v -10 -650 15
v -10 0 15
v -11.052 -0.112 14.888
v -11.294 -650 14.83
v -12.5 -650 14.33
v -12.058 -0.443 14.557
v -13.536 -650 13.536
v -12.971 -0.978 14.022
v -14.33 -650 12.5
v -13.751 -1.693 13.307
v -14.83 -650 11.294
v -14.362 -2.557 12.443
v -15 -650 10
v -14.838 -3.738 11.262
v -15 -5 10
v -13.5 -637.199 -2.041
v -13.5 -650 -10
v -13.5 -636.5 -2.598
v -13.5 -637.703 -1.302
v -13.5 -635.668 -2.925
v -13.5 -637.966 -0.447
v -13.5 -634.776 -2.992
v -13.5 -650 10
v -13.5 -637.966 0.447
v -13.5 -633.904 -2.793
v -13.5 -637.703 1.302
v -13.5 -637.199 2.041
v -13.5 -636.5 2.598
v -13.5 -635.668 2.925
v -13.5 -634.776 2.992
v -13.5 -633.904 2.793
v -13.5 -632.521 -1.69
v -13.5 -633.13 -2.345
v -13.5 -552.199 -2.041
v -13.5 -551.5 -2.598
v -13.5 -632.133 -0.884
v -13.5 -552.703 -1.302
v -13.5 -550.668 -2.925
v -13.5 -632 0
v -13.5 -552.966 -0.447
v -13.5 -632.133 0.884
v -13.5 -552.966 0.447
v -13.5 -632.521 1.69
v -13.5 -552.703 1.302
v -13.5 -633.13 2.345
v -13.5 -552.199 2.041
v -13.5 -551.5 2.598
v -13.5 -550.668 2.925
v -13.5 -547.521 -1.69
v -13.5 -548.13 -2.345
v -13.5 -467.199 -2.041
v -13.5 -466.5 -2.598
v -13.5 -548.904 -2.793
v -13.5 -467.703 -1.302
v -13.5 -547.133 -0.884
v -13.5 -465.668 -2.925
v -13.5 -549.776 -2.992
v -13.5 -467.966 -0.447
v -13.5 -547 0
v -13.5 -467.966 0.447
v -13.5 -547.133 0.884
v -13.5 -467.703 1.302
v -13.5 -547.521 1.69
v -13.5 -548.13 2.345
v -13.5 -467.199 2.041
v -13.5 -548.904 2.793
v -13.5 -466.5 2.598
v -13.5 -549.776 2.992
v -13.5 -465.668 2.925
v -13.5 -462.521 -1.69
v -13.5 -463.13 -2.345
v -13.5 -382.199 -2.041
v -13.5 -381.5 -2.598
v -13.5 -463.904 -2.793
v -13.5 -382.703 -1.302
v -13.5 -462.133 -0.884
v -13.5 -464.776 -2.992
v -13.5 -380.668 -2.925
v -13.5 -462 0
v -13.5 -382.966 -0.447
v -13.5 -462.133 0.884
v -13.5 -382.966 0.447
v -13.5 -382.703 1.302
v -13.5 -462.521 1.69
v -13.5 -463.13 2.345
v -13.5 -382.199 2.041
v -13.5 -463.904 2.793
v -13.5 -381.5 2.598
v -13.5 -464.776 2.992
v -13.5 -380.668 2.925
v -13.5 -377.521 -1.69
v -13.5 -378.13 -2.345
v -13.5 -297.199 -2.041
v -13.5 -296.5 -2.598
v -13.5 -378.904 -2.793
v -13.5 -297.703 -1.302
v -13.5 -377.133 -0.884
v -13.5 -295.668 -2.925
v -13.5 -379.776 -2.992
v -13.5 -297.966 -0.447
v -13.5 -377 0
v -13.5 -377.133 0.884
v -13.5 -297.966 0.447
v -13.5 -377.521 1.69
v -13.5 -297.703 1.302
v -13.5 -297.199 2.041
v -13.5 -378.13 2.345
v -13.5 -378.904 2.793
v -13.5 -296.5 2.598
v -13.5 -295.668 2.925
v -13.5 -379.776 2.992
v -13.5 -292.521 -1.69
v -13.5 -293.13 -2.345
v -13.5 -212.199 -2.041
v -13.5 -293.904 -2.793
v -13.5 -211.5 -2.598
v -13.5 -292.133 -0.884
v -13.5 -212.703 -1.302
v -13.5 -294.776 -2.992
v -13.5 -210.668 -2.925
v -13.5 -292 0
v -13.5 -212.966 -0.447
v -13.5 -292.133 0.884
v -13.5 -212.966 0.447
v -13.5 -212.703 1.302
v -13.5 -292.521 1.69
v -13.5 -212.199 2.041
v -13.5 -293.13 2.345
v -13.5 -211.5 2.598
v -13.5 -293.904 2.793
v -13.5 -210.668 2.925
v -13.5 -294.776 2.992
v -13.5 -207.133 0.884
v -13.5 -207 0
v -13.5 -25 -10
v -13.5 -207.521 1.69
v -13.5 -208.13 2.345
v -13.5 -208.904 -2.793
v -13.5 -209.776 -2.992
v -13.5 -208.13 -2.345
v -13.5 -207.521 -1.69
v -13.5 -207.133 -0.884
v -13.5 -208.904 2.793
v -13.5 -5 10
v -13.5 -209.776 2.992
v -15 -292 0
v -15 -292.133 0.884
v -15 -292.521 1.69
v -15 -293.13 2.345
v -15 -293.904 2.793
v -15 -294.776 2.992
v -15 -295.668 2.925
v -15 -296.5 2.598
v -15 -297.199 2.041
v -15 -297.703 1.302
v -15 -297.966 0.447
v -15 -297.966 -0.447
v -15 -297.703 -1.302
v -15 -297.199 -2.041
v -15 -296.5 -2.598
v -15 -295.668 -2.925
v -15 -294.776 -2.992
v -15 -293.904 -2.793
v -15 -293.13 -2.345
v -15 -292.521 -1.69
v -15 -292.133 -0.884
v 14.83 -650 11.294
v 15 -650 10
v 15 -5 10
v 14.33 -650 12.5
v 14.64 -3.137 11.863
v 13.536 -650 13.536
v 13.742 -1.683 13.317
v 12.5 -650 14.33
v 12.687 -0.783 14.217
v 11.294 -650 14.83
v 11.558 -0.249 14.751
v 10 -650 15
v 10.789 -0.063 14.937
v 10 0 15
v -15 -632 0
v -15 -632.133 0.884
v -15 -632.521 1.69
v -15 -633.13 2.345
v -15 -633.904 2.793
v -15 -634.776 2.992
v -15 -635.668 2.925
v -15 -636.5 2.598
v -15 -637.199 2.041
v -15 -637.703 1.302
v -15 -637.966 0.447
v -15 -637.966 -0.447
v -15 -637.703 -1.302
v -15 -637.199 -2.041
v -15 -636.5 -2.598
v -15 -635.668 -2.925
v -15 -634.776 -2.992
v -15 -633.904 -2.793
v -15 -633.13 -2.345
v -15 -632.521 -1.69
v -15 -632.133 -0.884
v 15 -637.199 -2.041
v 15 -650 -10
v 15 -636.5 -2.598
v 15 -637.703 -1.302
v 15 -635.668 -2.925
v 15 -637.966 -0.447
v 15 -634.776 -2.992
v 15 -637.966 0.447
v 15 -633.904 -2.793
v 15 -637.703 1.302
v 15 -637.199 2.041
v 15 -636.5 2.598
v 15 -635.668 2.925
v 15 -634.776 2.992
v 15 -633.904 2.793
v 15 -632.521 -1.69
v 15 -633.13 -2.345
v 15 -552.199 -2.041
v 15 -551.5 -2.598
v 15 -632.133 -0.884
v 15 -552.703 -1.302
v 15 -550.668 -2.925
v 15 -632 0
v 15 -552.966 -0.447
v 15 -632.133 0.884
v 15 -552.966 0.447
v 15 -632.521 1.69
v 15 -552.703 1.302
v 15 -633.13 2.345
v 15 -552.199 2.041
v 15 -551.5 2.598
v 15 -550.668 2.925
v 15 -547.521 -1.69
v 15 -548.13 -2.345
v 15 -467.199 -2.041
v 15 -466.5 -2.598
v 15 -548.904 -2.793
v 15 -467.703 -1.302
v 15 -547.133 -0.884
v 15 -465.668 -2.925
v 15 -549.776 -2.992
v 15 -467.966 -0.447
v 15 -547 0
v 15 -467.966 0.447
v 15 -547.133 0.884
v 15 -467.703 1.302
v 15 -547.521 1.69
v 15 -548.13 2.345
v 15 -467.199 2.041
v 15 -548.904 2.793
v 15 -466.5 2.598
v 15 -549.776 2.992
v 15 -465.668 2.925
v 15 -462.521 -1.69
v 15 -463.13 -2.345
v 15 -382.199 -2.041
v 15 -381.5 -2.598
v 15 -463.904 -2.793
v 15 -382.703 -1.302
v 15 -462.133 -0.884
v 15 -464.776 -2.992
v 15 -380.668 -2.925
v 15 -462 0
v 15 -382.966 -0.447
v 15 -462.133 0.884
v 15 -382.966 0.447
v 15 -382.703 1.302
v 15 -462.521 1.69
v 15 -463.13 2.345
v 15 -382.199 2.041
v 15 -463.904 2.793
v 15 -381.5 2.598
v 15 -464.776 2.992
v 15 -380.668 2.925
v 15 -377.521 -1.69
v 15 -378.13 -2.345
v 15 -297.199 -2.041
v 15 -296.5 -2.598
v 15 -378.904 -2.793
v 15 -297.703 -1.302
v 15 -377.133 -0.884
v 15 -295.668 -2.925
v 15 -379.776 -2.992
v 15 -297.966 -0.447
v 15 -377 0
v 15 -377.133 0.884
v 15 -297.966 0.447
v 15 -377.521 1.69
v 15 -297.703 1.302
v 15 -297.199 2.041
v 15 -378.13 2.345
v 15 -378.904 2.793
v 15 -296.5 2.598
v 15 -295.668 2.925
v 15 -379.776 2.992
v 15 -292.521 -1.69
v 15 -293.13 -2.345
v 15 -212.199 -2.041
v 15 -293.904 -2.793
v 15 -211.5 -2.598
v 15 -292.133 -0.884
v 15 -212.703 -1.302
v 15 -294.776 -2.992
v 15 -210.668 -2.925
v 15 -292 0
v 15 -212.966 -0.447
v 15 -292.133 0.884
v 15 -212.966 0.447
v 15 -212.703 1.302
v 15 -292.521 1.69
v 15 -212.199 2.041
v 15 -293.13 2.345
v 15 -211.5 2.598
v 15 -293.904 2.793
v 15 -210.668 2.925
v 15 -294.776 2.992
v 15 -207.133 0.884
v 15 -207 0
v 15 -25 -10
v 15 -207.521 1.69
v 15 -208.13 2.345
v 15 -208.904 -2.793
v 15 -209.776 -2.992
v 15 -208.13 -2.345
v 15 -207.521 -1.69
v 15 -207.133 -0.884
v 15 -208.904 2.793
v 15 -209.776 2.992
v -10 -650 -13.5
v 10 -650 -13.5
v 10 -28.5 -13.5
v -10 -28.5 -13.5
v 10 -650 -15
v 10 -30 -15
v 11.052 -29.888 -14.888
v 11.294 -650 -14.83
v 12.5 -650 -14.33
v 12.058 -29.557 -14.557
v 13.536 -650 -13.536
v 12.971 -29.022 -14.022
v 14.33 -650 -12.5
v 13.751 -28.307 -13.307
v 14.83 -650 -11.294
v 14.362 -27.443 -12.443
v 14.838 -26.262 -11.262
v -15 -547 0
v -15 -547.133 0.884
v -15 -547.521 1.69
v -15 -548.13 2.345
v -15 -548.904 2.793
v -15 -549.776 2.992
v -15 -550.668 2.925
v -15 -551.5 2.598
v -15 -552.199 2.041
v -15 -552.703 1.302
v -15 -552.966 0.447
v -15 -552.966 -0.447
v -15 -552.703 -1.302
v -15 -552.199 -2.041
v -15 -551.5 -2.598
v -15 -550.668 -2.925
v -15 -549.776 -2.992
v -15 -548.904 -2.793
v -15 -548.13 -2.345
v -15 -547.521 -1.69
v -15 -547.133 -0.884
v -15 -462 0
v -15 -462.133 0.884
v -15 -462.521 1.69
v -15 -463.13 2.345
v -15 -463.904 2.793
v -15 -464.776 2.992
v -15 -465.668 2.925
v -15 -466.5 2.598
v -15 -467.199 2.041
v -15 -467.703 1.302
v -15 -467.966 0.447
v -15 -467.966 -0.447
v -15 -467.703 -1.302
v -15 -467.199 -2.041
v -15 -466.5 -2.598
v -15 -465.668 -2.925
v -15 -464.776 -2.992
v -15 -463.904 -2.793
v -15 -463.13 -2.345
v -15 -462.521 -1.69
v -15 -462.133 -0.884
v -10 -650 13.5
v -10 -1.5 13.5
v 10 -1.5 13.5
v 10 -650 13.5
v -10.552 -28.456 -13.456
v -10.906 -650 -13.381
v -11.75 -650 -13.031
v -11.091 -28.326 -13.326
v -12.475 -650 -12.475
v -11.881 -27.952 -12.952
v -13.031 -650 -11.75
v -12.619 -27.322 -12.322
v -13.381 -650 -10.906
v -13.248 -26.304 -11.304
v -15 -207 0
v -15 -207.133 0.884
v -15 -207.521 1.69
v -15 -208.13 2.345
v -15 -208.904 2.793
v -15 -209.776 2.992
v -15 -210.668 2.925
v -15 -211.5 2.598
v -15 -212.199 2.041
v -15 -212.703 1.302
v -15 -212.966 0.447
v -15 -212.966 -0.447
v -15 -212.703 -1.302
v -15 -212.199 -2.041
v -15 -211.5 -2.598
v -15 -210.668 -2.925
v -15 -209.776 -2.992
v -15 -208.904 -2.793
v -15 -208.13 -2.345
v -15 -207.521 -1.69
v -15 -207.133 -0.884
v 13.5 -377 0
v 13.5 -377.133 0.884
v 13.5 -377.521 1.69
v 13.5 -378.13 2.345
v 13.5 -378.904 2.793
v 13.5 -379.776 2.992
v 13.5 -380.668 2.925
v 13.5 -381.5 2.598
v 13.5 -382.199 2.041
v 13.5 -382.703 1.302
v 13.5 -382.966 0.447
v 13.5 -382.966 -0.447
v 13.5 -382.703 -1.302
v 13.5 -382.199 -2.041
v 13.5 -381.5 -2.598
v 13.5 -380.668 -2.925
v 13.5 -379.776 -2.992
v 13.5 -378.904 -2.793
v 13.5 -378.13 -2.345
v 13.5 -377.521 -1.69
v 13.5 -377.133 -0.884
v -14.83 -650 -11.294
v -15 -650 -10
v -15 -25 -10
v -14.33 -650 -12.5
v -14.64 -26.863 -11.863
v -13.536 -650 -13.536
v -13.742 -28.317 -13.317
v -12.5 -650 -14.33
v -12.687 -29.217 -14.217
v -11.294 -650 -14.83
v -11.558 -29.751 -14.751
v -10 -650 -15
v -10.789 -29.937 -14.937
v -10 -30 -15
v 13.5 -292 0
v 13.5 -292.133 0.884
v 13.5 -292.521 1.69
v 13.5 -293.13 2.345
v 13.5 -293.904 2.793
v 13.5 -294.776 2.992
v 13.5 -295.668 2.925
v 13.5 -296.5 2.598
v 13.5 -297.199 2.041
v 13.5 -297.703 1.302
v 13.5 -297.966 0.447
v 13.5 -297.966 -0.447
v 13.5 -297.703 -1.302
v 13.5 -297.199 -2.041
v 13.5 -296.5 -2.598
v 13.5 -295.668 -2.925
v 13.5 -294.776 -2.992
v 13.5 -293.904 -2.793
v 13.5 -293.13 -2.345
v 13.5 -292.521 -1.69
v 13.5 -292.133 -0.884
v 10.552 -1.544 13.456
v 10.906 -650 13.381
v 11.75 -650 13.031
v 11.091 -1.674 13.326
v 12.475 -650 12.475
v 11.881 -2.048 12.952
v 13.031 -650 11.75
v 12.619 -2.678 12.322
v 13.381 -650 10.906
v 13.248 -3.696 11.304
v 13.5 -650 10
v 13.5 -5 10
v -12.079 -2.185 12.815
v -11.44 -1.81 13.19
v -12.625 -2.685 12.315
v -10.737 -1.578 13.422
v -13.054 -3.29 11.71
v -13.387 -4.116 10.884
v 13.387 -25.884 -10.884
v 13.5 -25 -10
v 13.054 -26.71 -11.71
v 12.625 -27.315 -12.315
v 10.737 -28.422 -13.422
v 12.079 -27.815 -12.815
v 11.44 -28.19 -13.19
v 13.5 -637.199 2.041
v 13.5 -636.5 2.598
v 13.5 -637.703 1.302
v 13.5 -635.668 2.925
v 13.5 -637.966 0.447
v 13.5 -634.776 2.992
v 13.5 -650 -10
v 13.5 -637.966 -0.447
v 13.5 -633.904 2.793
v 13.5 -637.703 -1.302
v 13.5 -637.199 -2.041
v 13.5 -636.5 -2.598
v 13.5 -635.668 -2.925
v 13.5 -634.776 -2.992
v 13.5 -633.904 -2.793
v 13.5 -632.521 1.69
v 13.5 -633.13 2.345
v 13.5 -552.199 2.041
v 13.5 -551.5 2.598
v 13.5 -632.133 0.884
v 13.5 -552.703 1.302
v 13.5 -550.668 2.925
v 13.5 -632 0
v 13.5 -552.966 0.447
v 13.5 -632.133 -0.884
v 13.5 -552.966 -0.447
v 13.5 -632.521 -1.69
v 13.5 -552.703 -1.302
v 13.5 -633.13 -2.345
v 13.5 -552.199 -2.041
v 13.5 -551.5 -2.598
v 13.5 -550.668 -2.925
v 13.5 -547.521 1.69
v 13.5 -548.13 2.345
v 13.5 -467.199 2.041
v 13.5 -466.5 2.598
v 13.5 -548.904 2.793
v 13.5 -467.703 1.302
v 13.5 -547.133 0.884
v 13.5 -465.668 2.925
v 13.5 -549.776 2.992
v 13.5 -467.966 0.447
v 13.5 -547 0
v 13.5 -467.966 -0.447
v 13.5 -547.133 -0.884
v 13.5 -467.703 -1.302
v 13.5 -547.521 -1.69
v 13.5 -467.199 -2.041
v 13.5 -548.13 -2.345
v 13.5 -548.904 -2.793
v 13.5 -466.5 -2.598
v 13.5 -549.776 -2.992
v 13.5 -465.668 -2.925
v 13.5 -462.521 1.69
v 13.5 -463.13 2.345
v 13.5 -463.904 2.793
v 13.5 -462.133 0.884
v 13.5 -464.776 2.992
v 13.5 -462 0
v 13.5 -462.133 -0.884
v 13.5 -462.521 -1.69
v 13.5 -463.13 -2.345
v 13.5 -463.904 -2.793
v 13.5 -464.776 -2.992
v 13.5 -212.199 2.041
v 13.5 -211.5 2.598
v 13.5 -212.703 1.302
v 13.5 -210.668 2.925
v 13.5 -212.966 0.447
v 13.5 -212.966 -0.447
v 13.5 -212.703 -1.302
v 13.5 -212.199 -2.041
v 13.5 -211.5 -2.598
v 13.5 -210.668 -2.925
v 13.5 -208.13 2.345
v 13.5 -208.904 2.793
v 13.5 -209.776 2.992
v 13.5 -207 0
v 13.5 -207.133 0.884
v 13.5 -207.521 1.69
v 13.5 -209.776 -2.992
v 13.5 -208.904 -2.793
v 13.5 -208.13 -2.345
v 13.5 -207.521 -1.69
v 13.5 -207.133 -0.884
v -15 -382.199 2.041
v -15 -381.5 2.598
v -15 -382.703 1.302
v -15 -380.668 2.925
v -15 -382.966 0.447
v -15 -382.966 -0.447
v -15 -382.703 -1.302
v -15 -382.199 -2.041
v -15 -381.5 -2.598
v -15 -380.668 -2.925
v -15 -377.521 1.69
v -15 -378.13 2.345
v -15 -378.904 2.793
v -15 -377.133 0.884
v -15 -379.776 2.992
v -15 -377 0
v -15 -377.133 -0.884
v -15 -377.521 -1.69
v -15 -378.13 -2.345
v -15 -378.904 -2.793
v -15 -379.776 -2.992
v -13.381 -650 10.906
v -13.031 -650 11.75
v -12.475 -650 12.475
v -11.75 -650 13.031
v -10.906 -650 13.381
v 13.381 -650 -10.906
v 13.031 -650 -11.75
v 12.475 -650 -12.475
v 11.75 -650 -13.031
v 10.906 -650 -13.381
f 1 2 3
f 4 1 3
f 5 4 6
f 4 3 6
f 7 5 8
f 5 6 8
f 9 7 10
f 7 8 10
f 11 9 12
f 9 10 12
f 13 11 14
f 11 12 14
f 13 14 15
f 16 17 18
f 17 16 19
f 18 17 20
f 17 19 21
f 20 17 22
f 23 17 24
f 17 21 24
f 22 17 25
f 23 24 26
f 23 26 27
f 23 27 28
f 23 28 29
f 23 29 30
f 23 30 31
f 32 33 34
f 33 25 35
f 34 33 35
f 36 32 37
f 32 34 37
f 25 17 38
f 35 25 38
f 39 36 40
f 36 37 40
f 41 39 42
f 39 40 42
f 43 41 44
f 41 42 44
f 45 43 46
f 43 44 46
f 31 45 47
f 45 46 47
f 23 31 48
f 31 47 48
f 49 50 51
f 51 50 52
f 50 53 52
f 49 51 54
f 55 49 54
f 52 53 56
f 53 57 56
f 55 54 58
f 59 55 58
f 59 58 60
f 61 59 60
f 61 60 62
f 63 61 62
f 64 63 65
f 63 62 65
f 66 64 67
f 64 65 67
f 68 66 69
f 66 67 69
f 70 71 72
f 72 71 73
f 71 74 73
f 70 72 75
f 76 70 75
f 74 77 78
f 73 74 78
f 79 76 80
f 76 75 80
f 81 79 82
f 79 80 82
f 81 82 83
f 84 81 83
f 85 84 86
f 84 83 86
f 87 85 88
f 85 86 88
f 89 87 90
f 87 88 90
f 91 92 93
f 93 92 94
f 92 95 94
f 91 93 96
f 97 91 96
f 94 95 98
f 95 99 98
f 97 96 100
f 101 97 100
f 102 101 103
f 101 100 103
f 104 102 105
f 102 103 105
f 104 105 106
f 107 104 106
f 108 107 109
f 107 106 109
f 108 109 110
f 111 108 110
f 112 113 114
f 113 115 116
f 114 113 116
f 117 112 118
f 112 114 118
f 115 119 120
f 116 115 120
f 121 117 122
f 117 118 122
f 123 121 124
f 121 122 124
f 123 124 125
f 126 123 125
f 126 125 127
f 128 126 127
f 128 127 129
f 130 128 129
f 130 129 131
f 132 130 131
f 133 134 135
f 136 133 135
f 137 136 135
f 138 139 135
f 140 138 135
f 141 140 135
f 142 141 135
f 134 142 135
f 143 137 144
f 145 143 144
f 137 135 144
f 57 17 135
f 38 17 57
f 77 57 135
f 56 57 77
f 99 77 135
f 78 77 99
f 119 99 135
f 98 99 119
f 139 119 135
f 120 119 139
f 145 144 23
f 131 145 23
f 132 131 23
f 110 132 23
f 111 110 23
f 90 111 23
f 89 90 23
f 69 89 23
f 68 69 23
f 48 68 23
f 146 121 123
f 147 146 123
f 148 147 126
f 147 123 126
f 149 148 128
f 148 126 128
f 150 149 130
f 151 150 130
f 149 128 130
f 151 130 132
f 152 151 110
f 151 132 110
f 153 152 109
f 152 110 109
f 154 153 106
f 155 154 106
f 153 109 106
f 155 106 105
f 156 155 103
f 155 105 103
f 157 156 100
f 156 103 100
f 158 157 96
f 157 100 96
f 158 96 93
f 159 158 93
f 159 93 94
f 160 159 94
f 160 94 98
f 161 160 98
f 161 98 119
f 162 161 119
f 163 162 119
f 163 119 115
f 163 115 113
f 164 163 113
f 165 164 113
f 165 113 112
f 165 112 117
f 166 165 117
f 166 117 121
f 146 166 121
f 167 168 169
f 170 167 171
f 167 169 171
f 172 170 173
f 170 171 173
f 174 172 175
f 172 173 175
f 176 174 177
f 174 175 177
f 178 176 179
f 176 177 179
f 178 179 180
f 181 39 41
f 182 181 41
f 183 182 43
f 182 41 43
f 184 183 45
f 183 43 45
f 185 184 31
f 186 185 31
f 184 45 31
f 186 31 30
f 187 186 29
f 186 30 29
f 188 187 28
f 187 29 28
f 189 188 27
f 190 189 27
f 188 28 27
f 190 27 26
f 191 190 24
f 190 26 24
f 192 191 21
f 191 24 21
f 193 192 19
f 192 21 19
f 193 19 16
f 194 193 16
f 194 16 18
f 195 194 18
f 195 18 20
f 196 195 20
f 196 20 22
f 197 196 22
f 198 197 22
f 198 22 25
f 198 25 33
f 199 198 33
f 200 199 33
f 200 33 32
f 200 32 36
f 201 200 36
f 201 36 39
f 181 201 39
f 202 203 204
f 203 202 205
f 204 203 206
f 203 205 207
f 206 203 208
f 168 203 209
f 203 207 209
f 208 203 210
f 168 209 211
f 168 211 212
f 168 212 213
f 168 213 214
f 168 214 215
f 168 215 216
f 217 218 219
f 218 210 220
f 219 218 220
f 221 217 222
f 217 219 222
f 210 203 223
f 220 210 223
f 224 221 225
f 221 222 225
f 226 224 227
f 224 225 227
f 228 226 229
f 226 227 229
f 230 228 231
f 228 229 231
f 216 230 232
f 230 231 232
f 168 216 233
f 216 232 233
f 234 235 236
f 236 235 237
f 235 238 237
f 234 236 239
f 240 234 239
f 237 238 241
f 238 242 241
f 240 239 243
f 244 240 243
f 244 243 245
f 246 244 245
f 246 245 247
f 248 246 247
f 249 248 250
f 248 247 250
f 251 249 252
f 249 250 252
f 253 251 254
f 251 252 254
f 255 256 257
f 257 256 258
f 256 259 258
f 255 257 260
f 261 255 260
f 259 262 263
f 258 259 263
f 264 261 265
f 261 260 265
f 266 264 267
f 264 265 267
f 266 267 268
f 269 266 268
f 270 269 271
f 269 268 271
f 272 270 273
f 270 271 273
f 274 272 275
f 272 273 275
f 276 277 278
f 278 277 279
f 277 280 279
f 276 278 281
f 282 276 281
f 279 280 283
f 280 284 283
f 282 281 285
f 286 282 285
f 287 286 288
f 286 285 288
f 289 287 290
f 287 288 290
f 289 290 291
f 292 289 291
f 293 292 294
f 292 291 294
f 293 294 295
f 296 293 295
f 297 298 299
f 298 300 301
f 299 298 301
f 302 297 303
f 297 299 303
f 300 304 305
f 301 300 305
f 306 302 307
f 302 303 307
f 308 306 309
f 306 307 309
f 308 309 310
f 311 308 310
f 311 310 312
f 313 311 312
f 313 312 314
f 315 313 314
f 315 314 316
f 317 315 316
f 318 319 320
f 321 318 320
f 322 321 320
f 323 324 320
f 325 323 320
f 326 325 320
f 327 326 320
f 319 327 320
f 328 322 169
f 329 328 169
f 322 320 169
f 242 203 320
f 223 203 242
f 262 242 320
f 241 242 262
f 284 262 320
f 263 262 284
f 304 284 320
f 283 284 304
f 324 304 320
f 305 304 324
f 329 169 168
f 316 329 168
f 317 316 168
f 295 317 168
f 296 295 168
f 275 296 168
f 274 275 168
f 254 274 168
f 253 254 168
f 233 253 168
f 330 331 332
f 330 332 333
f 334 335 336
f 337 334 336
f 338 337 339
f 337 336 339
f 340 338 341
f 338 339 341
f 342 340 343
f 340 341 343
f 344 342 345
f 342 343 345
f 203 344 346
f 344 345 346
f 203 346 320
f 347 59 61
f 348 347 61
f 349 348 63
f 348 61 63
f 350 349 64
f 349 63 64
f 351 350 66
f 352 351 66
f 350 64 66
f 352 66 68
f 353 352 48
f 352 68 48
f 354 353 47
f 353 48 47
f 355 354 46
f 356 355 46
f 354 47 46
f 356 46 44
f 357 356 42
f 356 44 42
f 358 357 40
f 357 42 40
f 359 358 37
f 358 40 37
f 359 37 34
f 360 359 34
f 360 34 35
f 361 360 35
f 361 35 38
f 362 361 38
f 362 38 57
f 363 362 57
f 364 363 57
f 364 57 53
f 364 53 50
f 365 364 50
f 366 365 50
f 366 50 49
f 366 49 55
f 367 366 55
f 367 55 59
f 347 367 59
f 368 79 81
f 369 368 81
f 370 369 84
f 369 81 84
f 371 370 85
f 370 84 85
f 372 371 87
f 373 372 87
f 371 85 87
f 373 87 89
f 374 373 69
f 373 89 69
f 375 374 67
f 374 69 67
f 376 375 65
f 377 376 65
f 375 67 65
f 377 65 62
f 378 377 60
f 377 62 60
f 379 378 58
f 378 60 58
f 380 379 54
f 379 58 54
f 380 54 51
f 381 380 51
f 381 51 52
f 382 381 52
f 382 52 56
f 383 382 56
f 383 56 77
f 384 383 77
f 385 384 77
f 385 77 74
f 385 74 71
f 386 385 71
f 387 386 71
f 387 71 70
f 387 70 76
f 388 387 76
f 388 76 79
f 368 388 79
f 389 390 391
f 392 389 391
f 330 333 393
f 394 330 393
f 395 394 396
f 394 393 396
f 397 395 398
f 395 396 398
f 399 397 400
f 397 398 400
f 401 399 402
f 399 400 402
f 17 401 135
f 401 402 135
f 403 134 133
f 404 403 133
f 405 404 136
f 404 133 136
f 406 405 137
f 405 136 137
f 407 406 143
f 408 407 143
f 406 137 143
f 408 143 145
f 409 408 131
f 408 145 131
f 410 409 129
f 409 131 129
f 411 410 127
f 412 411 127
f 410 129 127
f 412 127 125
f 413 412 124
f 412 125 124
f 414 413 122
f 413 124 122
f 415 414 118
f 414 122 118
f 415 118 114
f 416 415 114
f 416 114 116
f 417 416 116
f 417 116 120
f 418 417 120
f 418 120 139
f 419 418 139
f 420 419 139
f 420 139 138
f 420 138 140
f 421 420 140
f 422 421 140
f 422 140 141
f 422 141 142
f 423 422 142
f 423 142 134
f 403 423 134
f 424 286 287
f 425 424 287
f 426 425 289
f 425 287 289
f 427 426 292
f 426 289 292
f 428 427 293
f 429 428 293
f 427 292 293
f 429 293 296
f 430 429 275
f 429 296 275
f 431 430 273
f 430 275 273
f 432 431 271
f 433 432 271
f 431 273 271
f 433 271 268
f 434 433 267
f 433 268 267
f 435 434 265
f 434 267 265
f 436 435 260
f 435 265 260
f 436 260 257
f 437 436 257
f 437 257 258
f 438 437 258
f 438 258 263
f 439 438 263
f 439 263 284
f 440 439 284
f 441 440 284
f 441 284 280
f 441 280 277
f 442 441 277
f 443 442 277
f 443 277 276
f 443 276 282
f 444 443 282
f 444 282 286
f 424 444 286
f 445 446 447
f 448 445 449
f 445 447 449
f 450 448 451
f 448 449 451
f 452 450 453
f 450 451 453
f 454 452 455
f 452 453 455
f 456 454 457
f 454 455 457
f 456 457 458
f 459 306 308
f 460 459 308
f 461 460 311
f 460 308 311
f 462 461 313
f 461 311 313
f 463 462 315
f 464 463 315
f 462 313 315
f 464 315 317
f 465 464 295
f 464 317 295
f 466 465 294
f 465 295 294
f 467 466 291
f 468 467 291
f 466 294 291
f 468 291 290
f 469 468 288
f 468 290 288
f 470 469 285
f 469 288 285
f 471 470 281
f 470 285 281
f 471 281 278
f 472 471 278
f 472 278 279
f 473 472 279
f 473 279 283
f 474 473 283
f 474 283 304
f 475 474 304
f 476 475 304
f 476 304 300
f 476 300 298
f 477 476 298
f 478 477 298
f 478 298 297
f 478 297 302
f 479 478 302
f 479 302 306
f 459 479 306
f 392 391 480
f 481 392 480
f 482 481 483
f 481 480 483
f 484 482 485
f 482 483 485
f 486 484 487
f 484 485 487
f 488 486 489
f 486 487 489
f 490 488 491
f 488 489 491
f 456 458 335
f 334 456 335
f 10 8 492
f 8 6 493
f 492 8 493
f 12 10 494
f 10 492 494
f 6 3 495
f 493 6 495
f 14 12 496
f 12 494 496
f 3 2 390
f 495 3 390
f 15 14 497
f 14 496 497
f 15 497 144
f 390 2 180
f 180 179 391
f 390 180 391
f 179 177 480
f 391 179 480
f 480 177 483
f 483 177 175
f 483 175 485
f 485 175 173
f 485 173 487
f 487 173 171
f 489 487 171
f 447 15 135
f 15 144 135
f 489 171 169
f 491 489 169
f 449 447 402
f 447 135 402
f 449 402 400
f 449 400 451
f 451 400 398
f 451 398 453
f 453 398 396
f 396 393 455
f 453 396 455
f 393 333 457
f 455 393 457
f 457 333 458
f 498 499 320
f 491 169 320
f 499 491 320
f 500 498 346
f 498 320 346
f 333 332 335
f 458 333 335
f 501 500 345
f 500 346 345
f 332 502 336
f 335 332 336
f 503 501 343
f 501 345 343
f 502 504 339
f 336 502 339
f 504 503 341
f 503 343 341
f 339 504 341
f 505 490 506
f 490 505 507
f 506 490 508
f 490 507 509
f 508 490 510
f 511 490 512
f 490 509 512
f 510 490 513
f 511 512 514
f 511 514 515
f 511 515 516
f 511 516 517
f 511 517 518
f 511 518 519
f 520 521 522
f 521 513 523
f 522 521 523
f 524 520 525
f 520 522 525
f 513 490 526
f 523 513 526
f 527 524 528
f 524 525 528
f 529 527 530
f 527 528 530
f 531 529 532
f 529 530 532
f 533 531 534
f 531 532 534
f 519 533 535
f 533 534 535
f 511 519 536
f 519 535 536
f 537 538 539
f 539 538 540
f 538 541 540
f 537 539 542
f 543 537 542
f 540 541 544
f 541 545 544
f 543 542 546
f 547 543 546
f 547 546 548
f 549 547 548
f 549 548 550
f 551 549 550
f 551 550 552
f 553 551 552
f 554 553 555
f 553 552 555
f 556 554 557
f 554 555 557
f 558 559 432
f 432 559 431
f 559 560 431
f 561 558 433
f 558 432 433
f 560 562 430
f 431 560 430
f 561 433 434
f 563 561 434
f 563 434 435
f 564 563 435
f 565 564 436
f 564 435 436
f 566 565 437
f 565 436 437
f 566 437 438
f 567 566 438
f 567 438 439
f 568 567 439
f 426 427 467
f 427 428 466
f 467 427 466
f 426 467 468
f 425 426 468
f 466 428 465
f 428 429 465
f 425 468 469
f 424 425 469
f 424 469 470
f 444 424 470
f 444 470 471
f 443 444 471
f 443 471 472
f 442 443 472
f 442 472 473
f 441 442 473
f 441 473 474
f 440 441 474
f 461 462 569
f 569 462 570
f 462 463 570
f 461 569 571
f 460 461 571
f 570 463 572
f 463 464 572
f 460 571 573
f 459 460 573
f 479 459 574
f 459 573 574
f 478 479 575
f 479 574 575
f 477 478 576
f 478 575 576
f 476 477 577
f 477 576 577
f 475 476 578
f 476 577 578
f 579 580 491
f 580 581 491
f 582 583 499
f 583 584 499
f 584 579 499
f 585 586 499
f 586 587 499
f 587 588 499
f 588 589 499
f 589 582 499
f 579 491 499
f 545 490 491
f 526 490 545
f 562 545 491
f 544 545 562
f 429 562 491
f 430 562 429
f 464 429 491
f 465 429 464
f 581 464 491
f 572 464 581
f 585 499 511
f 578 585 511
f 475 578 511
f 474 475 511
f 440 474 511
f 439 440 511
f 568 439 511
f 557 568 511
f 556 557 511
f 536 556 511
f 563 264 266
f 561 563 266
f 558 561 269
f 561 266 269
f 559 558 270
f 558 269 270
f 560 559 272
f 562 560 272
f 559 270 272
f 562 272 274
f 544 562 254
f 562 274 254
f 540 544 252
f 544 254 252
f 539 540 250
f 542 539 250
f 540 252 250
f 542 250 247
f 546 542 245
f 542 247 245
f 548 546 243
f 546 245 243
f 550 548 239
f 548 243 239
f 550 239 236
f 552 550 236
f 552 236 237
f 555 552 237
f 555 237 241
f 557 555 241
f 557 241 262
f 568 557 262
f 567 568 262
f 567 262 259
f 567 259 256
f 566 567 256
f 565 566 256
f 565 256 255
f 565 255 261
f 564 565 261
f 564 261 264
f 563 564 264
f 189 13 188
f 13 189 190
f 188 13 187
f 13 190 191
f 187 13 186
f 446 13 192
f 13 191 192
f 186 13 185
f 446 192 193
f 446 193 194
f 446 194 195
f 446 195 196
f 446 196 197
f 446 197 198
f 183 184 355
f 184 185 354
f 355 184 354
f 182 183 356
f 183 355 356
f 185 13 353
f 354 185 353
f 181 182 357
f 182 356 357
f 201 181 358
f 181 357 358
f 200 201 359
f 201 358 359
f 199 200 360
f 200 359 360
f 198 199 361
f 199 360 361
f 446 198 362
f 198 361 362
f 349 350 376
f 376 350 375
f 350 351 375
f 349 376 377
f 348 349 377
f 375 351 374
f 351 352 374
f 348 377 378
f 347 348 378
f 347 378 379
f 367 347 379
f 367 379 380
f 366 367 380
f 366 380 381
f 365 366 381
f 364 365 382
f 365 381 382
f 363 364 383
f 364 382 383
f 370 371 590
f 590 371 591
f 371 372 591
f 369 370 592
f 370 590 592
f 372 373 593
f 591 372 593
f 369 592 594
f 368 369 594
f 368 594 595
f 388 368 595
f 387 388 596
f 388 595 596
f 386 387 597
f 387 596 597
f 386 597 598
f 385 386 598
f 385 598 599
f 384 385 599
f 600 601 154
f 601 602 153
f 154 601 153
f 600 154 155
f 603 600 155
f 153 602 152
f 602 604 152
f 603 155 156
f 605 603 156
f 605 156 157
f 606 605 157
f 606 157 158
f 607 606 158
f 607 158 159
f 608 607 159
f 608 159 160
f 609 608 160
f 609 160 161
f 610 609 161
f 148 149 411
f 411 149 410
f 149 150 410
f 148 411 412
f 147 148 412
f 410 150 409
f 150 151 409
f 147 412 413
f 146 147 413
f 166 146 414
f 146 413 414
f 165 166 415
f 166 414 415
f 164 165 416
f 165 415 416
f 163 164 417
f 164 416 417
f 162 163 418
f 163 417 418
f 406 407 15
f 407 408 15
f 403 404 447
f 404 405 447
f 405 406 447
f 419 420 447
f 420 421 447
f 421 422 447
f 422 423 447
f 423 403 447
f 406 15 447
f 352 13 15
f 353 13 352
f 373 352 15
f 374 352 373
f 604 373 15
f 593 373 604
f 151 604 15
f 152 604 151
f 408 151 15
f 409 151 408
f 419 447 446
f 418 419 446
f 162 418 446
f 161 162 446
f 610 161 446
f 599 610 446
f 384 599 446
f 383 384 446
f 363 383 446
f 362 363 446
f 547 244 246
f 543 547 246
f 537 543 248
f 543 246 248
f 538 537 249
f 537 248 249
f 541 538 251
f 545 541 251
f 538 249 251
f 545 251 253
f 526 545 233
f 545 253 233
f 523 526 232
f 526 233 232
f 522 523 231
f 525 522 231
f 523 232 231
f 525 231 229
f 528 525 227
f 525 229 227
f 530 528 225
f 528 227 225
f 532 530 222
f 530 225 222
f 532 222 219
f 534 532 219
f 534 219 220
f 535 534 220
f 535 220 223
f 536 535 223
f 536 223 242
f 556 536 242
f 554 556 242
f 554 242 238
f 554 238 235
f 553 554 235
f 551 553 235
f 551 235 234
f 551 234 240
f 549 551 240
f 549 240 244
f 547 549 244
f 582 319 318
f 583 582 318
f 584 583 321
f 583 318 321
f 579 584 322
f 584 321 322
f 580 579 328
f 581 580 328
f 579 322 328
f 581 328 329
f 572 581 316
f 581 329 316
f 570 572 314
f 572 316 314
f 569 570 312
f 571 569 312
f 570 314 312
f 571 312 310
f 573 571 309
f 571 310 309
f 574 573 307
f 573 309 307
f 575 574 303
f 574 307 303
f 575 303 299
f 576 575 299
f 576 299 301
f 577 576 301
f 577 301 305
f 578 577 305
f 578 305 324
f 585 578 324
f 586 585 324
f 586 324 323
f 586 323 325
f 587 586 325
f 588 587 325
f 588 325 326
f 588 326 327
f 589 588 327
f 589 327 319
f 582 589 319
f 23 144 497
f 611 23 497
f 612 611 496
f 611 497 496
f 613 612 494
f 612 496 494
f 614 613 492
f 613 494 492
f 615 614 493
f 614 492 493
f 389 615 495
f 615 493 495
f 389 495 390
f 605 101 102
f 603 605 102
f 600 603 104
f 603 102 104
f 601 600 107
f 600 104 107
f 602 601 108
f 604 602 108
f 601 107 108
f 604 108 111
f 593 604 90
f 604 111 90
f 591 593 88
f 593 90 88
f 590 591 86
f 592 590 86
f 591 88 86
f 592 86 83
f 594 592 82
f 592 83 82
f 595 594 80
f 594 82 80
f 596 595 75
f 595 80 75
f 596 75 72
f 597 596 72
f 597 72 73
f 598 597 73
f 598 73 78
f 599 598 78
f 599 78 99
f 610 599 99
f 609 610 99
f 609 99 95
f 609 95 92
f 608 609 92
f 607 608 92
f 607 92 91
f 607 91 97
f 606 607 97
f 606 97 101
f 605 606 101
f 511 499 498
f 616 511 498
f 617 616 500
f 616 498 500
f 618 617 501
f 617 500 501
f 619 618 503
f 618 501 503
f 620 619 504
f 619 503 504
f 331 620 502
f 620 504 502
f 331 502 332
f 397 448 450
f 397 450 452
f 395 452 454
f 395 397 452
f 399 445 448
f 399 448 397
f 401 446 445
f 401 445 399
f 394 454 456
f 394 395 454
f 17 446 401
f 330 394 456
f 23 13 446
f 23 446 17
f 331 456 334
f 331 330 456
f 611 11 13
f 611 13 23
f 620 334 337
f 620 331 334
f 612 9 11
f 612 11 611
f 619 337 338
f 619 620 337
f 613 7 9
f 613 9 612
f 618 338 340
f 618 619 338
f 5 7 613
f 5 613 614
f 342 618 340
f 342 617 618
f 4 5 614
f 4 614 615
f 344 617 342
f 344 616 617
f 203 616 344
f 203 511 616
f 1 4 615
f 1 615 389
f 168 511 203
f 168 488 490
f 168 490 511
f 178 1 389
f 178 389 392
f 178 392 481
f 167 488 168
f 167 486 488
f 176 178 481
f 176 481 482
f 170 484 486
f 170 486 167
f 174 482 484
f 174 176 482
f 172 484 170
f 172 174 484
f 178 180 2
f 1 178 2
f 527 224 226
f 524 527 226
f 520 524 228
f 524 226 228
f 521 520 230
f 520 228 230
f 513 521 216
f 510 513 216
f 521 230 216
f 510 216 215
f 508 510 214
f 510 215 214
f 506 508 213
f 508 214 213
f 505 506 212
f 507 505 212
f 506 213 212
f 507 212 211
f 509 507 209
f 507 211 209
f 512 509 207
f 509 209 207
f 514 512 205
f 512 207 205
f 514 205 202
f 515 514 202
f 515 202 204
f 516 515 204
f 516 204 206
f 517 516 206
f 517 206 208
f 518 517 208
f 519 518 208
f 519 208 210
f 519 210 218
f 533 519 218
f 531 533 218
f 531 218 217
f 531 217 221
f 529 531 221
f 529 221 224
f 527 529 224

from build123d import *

# Parameters (mm, degrees)
F1_DEPTH = 650
F3_DEPTH = 30.001
F4_R     = 3
F5_DEPTH = 30.001


with BuildPart() as f1:
    # F0 (on Front) → F1 (new body)
    with BuildSketch(Plane.XZ):
        with BuildLine():
            Line((-10, -15), (10, -15))
            ThreePointArc((10, -15), (13.535534, -13.535534), (15, -10))
            Line((15, -10), (15, 10))
            ThreePointArc((15, 10), (13.535534, 13.535534), (10, 15))
            Line((10, 15), (-10, 15))
            ThreePointArc((-10, 15), (-13.535534, 13.535534), (-15, 10))
            Line((-15, 10), (-15, -10))
            ThreePointArc((-15, -10), (-13.535534, -13.535534), (-10, -15))
        make_face()
        with BuildLine():
            ThreePointArc((-10, -13.5), (-12.474874, -12.474874), (-13.5, -10))
            Line((-13.5, -10), (-13.5, 10))
            ThreePointArc((-13.5, 10), (-12.474874, 12.474874), (-10, 13.5))
            Line((-10, 13.5), (10, 13.5))
            ThreePointArc((10, 13.5), (12.474874, 12.474874), (13.5, 10))
            Line((13.5, 10), (13.5, -10))
            ThreePointArc((13.5, -10), (12.474874, -12.474874), (10, -13.5))
            Line((10, -13.5), (-10, -13.5))
        make_face(mode=Mode.SUBTRACT)
    extrude(amount=F1_DEPTH)

    # F2 (on face) → F3 (cut, through all)
    with BuildSketch(Plane.YZ.offset(15)):
        Polygon((0, -15), (0, 15), (-30, -15), align=None)
    extrude(amount=-F3_DEPTH, mode=Mode.SUBTRACT)

    # F4 (on face) → F5 (cut, through all)
    with BuildSketch(Plane.YZ.offset(15)):
        with Locations((-635, 0)):
            Circle(F4_R)
        with Locations((-550, 0)):
            Circle(F4_R)
        with Locations((-465, 0)):
            Circle(F4_R)
        with Locations((-380, 0)):
            Circle(F4_R)
        with Locations((-295, 0)):
            Circle(F4_R)
        with Locations((-210, 0)):
            Circle(F4_R)
    extrude(amount=-F5_DEPTH, mode=Mode.SUBTRACT)


solid = f1.part
